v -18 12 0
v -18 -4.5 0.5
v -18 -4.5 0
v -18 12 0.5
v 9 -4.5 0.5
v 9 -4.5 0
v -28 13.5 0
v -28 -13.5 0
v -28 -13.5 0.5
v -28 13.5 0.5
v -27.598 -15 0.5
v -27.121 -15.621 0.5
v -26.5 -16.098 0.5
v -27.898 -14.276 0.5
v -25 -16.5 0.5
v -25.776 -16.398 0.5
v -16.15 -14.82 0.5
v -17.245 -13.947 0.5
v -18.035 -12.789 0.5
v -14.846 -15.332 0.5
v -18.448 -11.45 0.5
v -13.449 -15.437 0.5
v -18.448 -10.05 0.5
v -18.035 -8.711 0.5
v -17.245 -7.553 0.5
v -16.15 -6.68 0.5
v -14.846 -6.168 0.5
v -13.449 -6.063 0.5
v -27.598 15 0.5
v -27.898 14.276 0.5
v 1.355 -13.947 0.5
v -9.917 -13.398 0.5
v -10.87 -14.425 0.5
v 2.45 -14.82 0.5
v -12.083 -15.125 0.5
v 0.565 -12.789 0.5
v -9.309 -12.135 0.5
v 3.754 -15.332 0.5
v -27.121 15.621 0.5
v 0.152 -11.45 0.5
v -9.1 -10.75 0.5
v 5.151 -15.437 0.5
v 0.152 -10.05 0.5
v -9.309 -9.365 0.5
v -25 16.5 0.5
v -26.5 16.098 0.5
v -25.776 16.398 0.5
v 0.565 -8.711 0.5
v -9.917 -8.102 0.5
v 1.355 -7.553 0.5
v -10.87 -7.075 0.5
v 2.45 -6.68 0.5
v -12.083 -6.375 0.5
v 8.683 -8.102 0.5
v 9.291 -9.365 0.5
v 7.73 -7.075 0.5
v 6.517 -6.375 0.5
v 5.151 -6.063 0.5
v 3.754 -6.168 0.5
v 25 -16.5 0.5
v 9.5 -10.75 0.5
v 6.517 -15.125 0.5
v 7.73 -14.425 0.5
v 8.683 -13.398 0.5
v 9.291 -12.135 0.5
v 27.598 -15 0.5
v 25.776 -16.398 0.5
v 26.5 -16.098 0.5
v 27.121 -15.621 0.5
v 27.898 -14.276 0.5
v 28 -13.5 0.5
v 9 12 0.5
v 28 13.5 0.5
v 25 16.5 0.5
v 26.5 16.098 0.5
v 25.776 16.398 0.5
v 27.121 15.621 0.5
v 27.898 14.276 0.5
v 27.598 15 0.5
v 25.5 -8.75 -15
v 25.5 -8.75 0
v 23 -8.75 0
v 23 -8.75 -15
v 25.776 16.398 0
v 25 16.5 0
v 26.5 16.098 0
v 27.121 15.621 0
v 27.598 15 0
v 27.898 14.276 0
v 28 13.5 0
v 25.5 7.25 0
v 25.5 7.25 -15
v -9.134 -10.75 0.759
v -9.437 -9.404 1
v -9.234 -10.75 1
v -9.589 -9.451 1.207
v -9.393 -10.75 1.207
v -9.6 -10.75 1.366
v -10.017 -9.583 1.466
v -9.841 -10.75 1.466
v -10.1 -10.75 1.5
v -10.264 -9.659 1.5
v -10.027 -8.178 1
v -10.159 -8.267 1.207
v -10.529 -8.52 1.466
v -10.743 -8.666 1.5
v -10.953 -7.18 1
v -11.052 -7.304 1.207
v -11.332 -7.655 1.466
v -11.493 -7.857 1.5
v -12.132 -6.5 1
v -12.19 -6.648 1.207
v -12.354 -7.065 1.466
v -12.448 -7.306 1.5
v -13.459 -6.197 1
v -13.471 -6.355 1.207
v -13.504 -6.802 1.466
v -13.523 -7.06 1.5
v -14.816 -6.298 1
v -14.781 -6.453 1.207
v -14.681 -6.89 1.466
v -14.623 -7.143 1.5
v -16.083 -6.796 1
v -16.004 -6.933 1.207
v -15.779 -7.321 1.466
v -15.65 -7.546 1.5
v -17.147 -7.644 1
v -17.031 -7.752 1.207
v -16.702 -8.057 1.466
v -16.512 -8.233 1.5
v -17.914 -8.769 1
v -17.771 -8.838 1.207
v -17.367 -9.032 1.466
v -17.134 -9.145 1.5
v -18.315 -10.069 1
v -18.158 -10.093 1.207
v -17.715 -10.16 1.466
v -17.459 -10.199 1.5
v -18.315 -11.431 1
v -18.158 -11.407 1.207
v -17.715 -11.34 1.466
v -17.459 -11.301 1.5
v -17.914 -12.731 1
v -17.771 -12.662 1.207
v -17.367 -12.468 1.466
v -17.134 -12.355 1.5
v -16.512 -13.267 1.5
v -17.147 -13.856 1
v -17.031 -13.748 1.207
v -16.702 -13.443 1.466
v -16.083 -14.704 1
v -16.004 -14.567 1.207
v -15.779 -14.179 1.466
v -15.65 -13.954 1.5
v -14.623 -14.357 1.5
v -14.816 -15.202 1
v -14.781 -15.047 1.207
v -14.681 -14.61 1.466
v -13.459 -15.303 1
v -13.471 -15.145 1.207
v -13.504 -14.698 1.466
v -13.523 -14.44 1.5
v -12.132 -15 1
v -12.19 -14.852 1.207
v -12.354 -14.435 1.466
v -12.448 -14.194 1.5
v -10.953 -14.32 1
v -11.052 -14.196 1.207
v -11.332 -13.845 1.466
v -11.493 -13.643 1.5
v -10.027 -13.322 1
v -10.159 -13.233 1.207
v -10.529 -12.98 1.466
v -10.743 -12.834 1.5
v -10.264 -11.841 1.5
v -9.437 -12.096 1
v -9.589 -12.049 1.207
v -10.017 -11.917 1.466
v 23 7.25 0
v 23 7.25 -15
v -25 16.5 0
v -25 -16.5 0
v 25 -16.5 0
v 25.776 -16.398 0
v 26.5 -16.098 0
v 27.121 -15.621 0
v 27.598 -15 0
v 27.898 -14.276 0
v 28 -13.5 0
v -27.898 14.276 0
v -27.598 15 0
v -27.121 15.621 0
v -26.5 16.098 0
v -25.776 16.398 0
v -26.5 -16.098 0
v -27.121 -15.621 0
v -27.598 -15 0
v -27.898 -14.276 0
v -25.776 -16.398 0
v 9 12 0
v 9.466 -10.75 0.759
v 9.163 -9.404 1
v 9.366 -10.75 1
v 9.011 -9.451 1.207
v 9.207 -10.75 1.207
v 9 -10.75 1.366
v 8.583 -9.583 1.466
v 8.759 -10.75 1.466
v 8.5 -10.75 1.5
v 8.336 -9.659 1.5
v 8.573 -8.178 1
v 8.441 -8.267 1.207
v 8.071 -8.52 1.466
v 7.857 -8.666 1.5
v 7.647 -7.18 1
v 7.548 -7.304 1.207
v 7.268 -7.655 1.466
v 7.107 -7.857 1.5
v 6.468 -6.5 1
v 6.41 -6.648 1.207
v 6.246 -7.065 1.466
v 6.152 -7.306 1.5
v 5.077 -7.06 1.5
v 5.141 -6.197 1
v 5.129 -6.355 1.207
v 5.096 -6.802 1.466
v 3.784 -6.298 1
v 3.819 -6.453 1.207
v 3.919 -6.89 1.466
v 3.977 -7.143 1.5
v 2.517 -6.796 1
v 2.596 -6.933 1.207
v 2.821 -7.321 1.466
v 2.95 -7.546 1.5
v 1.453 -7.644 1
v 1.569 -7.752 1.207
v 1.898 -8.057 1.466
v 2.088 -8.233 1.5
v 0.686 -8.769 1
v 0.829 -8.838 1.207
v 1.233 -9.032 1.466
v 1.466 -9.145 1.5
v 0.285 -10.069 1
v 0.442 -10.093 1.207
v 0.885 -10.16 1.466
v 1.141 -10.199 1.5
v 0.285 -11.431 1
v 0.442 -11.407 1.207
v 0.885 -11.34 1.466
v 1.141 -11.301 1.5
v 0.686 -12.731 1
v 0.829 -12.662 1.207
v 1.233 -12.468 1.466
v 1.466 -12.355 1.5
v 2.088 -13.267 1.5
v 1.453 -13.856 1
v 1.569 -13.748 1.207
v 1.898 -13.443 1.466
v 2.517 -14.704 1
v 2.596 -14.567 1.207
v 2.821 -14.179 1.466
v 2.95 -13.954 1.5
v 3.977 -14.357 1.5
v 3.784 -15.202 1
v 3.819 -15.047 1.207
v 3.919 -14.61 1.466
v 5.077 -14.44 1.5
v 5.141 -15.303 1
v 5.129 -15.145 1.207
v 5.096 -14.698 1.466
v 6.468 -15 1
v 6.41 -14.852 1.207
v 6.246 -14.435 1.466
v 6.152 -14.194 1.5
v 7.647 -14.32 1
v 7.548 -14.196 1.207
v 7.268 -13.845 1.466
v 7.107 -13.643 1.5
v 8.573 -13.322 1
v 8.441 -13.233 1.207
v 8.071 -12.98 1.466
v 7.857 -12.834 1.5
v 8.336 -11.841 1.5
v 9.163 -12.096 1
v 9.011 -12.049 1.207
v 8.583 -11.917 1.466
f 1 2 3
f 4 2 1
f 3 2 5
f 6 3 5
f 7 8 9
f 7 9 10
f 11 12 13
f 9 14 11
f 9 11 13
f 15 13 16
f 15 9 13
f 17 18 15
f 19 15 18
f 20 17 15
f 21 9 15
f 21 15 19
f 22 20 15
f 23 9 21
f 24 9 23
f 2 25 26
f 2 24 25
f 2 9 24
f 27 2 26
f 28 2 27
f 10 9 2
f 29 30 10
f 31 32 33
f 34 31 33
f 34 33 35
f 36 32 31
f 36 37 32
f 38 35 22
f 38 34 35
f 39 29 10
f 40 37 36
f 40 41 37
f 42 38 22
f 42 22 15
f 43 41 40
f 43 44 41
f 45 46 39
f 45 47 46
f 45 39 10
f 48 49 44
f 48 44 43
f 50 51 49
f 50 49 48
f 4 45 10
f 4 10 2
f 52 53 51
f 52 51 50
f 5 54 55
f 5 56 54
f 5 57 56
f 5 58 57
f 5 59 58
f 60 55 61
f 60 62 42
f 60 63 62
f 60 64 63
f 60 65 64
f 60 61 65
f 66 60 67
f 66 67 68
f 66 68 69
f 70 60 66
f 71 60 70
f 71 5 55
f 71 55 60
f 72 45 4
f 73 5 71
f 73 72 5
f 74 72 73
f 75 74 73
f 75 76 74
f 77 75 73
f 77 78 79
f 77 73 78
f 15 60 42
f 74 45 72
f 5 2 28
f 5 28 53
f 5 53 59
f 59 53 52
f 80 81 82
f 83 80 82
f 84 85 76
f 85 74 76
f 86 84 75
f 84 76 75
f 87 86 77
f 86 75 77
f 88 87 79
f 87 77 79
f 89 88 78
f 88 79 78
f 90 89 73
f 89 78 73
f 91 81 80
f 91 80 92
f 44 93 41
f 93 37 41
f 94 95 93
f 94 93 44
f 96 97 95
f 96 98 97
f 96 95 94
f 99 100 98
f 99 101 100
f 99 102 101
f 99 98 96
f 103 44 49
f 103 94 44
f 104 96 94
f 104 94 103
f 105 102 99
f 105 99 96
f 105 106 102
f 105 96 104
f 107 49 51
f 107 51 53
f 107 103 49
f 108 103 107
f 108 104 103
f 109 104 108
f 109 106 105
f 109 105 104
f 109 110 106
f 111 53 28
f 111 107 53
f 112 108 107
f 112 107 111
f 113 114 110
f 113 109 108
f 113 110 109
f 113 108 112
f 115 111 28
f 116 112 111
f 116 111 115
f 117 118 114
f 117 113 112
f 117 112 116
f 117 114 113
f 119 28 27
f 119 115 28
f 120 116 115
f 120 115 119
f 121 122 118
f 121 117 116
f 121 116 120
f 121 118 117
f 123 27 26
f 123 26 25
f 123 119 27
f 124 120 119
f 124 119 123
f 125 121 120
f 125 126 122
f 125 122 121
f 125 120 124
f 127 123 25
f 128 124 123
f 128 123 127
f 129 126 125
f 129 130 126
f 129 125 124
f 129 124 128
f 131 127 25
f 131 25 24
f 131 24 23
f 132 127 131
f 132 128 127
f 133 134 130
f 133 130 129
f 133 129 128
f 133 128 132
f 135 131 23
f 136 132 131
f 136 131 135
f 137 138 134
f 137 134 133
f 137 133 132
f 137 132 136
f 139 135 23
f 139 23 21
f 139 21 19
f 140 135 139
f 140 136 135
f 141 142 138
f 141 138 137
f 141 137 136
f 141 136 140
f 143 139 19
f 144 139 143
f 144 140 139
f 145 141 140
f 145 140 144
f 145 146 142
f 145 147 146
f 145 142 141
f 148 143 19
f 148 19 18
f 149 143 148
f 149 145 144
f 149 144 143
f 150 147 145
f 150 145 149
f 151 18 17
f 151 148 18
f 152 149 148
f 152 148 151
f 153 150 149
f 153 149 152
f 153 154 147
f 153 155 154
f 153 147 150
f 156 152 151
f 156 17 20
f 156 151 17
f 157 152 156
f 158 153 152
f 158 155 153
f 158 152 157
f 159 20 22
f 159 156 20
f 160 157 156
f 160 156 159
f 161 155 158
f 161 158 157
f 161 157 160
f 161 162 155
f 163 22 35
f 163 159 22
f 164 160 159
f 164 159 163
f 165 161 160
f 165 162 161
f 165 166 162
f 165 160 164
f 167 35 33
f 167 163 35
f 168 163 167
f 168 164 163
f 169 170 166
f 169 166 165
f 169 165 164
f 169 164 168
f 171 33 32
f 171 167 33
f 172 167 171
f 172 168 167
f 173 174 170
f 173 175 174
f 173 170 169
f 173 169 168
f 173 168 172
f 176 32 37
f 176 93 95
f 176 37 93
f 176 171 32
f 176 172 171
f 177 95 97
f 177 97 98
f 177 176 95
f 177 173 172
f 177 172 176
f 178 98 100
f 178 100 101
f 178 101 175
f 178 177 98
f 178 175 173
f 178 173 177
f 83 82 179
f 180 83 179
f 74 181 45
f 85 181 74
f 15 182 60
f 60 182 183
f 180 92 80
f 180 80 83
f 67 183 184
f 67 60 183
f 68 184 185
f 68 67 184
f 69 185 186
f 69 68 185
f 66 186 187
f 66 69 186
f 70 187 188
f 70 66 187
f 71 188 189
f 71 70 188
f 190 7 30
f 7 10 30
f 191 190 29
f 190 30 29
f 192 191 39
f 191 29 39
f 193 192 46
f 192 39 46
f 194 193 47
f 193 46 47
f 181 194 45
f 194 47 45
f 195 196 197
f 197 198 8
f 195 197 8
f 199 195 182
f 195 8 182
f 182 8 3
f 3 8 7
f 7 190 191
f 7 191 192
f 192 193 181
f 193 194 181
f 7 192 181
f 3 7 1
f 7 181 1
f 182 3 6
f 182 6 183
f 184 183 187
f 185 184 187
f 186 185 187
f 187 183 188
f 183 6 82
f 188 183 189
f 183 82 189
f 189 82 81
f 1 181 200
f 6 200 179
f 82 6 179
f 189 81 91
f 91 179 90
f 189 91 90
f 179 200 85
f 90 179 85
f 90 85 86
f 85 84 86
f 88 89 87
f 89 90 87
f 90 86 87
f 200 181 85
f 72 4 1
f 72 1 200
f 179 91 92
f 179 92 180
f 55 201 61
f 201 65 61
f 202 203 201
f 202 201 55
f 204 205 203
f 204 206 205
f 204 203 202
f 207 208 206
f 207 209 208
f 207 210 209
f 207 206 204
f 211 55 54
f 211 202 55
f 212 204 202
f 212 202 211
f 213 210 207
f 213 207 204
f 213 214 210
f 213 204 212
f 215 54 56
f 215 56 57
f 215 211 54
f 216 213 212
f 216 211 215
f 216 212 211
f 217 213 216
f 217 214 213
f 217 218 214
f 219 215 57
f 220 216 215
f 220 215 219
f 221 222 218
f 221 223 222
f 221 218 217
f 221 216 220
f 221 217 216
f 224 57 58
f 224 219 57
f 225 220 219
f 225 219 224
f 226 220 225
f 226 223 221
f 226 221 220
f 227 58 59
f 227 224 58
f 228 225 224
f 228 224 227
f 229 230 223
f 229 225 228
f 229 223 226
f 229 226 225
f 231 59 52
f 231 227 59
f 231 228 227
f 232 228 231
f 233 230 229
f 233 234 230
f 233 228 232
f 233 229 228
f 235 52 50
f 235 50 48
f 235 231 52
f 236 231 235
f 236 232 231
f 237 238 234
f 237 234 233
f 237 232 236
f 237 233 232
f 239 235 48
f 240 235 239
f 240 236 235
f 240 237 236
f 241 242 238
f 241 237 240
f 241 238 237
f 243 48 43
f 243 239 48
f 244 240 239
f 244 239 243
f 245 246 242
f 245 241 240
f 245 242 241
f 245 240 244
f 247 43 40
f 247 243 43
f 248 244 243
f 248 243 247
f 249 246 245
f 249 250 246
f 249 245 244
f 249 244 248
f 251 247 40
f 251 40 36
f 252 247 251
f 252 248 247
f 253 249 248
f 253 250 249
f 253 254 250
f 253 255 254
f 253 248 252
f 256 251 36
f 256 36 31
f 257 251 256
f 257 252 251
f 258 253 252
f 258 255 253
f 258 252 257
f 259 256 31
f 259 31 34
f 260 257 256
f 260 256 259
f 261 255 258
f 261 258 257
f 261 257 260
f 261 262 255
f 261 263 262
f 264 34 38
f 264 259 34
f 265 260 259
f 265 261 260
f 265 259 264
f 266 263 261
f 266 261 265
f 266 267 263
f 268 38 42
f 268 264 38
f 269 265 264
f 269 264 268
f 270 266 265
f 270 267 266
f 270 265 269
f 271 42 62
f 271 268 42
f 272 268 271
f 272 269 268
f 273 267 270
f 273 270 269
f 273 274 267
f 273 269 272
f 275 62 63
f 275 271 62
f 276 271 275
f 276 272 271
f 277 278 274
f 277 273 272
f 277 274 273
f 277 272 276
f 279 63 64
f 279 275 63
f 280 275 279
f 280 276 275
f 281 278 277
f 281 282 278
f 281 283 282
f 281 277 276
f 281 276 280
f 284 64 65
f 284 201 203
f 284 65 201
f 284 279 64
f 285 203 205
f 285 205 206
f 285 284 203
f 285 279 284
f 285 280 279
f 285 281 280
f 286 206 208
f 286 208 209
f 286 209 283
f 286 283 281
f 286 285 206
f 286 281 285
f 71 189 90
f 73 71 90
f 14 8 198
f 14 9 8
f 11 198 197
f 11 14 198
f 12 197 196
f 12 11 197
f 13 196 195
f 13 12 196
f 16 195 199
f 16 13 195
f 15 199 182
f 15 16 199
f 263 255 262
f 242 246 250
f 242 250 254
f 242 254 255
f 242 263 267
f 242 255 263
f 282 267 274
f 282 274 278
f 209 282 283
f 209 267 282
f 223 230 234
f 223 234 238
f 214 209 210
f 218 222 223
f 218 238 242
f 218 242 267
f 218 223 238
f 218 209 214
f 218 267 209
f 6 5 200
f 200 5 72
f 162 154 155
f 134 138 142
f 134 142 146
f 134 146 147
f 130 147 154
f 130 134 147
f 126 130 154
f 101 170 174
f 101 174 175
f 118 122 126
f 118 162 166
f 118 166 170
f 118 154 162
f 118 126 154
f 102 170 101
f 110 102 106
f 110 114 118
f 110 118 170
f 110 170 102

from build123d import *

# Parameters (mm, degrees)
SKETCH1_W           = 56
SKETCH1_H           = 33
BOSS_EXTRUDE1_DEPTH = 0.5
SKETCH2_W           = 27
SKETCH2_H           = 16.5
CUT_EXTRUDE1_DEPTH  = 0.5
SKETCH3_R           = 4.7
BOSS_EXTRUDE2_DEPTH = 1
FILLET1_R           = 1
SKETCH4_W           = 2.5
SKETCH4_H           = 16
BOSS_EXTRUDE3_DEPTH = 15
FILLET2_R           = 3


with BuildPart() as part:
    # Sketch1 → Boss-Extrude1 (new body)
    with BuildSketch(Plane.XY):
        Rectangle(SKETCH1_W, SKETCH1_H)
    extrude(amount=BOSS_EXTRUDE1_DEPTH)

    # Sketch2 → Cut-Extrude1 (cut)
    with BuildSketch(Plane.XY.offset(0.5)):
        with Locations((-4.5, 3.75)):
            Rectangle(SKETCH2_W, SKETCH2_H)
    extrude(amount=-CUT_EXTRUDE1_DEPTH, mode=Mode.SUBTRACT)

    # Sketch3 → Boss-Extrude2 (add)
    with BuildSketch(Plane.XY.offset(0.5)):
        with Locations((-13.8, -10.75)):
            Circle(SKETCH3_R)
        with Locations((4.8, -10.75)):
            Circle(SKETCH3_R)
    extrude(amount=BOSS_EXTRUDE2_DEPTH)

    # Fillet1
    fillet1_edges = [part.edges().sort_by_distance(p)[0] for p in [
        (-18.5, -10.75, 1.5),
        (0.1, -10.75, 1.5),
    ]]
    fillet(fillet1_edges, radius=FILLET1_R - 0.0001)  # a hair under: the kernel refuses the full size

    # Sketch4 → Boss-Extrude3 (add)
    with BuildSketch(Plane(origin=(0, 0, 0), x_dir=(-1, 0, 0), z_dir=(0, 0, -1))):
        with Locations((-24.25, -0.75)):
            Rectangle(SKETCH4_W, SKETCH4_H)
    extrude(amount=BOSS_EXTRUDE3_DEPTH)

    # Fillet2
    fillet2_edges = [part.edges().sort_by_distance(p)[0] for p in [
        (28, -16.5, 0.25),
        (-28, -16.5, 0.25),
        (-28, 16.5, 0.25),
        (28, 16.5, 0.25),
    ]]
    fillet(fillet2_edges, radius=FILLET2_R)


solid = part.part
